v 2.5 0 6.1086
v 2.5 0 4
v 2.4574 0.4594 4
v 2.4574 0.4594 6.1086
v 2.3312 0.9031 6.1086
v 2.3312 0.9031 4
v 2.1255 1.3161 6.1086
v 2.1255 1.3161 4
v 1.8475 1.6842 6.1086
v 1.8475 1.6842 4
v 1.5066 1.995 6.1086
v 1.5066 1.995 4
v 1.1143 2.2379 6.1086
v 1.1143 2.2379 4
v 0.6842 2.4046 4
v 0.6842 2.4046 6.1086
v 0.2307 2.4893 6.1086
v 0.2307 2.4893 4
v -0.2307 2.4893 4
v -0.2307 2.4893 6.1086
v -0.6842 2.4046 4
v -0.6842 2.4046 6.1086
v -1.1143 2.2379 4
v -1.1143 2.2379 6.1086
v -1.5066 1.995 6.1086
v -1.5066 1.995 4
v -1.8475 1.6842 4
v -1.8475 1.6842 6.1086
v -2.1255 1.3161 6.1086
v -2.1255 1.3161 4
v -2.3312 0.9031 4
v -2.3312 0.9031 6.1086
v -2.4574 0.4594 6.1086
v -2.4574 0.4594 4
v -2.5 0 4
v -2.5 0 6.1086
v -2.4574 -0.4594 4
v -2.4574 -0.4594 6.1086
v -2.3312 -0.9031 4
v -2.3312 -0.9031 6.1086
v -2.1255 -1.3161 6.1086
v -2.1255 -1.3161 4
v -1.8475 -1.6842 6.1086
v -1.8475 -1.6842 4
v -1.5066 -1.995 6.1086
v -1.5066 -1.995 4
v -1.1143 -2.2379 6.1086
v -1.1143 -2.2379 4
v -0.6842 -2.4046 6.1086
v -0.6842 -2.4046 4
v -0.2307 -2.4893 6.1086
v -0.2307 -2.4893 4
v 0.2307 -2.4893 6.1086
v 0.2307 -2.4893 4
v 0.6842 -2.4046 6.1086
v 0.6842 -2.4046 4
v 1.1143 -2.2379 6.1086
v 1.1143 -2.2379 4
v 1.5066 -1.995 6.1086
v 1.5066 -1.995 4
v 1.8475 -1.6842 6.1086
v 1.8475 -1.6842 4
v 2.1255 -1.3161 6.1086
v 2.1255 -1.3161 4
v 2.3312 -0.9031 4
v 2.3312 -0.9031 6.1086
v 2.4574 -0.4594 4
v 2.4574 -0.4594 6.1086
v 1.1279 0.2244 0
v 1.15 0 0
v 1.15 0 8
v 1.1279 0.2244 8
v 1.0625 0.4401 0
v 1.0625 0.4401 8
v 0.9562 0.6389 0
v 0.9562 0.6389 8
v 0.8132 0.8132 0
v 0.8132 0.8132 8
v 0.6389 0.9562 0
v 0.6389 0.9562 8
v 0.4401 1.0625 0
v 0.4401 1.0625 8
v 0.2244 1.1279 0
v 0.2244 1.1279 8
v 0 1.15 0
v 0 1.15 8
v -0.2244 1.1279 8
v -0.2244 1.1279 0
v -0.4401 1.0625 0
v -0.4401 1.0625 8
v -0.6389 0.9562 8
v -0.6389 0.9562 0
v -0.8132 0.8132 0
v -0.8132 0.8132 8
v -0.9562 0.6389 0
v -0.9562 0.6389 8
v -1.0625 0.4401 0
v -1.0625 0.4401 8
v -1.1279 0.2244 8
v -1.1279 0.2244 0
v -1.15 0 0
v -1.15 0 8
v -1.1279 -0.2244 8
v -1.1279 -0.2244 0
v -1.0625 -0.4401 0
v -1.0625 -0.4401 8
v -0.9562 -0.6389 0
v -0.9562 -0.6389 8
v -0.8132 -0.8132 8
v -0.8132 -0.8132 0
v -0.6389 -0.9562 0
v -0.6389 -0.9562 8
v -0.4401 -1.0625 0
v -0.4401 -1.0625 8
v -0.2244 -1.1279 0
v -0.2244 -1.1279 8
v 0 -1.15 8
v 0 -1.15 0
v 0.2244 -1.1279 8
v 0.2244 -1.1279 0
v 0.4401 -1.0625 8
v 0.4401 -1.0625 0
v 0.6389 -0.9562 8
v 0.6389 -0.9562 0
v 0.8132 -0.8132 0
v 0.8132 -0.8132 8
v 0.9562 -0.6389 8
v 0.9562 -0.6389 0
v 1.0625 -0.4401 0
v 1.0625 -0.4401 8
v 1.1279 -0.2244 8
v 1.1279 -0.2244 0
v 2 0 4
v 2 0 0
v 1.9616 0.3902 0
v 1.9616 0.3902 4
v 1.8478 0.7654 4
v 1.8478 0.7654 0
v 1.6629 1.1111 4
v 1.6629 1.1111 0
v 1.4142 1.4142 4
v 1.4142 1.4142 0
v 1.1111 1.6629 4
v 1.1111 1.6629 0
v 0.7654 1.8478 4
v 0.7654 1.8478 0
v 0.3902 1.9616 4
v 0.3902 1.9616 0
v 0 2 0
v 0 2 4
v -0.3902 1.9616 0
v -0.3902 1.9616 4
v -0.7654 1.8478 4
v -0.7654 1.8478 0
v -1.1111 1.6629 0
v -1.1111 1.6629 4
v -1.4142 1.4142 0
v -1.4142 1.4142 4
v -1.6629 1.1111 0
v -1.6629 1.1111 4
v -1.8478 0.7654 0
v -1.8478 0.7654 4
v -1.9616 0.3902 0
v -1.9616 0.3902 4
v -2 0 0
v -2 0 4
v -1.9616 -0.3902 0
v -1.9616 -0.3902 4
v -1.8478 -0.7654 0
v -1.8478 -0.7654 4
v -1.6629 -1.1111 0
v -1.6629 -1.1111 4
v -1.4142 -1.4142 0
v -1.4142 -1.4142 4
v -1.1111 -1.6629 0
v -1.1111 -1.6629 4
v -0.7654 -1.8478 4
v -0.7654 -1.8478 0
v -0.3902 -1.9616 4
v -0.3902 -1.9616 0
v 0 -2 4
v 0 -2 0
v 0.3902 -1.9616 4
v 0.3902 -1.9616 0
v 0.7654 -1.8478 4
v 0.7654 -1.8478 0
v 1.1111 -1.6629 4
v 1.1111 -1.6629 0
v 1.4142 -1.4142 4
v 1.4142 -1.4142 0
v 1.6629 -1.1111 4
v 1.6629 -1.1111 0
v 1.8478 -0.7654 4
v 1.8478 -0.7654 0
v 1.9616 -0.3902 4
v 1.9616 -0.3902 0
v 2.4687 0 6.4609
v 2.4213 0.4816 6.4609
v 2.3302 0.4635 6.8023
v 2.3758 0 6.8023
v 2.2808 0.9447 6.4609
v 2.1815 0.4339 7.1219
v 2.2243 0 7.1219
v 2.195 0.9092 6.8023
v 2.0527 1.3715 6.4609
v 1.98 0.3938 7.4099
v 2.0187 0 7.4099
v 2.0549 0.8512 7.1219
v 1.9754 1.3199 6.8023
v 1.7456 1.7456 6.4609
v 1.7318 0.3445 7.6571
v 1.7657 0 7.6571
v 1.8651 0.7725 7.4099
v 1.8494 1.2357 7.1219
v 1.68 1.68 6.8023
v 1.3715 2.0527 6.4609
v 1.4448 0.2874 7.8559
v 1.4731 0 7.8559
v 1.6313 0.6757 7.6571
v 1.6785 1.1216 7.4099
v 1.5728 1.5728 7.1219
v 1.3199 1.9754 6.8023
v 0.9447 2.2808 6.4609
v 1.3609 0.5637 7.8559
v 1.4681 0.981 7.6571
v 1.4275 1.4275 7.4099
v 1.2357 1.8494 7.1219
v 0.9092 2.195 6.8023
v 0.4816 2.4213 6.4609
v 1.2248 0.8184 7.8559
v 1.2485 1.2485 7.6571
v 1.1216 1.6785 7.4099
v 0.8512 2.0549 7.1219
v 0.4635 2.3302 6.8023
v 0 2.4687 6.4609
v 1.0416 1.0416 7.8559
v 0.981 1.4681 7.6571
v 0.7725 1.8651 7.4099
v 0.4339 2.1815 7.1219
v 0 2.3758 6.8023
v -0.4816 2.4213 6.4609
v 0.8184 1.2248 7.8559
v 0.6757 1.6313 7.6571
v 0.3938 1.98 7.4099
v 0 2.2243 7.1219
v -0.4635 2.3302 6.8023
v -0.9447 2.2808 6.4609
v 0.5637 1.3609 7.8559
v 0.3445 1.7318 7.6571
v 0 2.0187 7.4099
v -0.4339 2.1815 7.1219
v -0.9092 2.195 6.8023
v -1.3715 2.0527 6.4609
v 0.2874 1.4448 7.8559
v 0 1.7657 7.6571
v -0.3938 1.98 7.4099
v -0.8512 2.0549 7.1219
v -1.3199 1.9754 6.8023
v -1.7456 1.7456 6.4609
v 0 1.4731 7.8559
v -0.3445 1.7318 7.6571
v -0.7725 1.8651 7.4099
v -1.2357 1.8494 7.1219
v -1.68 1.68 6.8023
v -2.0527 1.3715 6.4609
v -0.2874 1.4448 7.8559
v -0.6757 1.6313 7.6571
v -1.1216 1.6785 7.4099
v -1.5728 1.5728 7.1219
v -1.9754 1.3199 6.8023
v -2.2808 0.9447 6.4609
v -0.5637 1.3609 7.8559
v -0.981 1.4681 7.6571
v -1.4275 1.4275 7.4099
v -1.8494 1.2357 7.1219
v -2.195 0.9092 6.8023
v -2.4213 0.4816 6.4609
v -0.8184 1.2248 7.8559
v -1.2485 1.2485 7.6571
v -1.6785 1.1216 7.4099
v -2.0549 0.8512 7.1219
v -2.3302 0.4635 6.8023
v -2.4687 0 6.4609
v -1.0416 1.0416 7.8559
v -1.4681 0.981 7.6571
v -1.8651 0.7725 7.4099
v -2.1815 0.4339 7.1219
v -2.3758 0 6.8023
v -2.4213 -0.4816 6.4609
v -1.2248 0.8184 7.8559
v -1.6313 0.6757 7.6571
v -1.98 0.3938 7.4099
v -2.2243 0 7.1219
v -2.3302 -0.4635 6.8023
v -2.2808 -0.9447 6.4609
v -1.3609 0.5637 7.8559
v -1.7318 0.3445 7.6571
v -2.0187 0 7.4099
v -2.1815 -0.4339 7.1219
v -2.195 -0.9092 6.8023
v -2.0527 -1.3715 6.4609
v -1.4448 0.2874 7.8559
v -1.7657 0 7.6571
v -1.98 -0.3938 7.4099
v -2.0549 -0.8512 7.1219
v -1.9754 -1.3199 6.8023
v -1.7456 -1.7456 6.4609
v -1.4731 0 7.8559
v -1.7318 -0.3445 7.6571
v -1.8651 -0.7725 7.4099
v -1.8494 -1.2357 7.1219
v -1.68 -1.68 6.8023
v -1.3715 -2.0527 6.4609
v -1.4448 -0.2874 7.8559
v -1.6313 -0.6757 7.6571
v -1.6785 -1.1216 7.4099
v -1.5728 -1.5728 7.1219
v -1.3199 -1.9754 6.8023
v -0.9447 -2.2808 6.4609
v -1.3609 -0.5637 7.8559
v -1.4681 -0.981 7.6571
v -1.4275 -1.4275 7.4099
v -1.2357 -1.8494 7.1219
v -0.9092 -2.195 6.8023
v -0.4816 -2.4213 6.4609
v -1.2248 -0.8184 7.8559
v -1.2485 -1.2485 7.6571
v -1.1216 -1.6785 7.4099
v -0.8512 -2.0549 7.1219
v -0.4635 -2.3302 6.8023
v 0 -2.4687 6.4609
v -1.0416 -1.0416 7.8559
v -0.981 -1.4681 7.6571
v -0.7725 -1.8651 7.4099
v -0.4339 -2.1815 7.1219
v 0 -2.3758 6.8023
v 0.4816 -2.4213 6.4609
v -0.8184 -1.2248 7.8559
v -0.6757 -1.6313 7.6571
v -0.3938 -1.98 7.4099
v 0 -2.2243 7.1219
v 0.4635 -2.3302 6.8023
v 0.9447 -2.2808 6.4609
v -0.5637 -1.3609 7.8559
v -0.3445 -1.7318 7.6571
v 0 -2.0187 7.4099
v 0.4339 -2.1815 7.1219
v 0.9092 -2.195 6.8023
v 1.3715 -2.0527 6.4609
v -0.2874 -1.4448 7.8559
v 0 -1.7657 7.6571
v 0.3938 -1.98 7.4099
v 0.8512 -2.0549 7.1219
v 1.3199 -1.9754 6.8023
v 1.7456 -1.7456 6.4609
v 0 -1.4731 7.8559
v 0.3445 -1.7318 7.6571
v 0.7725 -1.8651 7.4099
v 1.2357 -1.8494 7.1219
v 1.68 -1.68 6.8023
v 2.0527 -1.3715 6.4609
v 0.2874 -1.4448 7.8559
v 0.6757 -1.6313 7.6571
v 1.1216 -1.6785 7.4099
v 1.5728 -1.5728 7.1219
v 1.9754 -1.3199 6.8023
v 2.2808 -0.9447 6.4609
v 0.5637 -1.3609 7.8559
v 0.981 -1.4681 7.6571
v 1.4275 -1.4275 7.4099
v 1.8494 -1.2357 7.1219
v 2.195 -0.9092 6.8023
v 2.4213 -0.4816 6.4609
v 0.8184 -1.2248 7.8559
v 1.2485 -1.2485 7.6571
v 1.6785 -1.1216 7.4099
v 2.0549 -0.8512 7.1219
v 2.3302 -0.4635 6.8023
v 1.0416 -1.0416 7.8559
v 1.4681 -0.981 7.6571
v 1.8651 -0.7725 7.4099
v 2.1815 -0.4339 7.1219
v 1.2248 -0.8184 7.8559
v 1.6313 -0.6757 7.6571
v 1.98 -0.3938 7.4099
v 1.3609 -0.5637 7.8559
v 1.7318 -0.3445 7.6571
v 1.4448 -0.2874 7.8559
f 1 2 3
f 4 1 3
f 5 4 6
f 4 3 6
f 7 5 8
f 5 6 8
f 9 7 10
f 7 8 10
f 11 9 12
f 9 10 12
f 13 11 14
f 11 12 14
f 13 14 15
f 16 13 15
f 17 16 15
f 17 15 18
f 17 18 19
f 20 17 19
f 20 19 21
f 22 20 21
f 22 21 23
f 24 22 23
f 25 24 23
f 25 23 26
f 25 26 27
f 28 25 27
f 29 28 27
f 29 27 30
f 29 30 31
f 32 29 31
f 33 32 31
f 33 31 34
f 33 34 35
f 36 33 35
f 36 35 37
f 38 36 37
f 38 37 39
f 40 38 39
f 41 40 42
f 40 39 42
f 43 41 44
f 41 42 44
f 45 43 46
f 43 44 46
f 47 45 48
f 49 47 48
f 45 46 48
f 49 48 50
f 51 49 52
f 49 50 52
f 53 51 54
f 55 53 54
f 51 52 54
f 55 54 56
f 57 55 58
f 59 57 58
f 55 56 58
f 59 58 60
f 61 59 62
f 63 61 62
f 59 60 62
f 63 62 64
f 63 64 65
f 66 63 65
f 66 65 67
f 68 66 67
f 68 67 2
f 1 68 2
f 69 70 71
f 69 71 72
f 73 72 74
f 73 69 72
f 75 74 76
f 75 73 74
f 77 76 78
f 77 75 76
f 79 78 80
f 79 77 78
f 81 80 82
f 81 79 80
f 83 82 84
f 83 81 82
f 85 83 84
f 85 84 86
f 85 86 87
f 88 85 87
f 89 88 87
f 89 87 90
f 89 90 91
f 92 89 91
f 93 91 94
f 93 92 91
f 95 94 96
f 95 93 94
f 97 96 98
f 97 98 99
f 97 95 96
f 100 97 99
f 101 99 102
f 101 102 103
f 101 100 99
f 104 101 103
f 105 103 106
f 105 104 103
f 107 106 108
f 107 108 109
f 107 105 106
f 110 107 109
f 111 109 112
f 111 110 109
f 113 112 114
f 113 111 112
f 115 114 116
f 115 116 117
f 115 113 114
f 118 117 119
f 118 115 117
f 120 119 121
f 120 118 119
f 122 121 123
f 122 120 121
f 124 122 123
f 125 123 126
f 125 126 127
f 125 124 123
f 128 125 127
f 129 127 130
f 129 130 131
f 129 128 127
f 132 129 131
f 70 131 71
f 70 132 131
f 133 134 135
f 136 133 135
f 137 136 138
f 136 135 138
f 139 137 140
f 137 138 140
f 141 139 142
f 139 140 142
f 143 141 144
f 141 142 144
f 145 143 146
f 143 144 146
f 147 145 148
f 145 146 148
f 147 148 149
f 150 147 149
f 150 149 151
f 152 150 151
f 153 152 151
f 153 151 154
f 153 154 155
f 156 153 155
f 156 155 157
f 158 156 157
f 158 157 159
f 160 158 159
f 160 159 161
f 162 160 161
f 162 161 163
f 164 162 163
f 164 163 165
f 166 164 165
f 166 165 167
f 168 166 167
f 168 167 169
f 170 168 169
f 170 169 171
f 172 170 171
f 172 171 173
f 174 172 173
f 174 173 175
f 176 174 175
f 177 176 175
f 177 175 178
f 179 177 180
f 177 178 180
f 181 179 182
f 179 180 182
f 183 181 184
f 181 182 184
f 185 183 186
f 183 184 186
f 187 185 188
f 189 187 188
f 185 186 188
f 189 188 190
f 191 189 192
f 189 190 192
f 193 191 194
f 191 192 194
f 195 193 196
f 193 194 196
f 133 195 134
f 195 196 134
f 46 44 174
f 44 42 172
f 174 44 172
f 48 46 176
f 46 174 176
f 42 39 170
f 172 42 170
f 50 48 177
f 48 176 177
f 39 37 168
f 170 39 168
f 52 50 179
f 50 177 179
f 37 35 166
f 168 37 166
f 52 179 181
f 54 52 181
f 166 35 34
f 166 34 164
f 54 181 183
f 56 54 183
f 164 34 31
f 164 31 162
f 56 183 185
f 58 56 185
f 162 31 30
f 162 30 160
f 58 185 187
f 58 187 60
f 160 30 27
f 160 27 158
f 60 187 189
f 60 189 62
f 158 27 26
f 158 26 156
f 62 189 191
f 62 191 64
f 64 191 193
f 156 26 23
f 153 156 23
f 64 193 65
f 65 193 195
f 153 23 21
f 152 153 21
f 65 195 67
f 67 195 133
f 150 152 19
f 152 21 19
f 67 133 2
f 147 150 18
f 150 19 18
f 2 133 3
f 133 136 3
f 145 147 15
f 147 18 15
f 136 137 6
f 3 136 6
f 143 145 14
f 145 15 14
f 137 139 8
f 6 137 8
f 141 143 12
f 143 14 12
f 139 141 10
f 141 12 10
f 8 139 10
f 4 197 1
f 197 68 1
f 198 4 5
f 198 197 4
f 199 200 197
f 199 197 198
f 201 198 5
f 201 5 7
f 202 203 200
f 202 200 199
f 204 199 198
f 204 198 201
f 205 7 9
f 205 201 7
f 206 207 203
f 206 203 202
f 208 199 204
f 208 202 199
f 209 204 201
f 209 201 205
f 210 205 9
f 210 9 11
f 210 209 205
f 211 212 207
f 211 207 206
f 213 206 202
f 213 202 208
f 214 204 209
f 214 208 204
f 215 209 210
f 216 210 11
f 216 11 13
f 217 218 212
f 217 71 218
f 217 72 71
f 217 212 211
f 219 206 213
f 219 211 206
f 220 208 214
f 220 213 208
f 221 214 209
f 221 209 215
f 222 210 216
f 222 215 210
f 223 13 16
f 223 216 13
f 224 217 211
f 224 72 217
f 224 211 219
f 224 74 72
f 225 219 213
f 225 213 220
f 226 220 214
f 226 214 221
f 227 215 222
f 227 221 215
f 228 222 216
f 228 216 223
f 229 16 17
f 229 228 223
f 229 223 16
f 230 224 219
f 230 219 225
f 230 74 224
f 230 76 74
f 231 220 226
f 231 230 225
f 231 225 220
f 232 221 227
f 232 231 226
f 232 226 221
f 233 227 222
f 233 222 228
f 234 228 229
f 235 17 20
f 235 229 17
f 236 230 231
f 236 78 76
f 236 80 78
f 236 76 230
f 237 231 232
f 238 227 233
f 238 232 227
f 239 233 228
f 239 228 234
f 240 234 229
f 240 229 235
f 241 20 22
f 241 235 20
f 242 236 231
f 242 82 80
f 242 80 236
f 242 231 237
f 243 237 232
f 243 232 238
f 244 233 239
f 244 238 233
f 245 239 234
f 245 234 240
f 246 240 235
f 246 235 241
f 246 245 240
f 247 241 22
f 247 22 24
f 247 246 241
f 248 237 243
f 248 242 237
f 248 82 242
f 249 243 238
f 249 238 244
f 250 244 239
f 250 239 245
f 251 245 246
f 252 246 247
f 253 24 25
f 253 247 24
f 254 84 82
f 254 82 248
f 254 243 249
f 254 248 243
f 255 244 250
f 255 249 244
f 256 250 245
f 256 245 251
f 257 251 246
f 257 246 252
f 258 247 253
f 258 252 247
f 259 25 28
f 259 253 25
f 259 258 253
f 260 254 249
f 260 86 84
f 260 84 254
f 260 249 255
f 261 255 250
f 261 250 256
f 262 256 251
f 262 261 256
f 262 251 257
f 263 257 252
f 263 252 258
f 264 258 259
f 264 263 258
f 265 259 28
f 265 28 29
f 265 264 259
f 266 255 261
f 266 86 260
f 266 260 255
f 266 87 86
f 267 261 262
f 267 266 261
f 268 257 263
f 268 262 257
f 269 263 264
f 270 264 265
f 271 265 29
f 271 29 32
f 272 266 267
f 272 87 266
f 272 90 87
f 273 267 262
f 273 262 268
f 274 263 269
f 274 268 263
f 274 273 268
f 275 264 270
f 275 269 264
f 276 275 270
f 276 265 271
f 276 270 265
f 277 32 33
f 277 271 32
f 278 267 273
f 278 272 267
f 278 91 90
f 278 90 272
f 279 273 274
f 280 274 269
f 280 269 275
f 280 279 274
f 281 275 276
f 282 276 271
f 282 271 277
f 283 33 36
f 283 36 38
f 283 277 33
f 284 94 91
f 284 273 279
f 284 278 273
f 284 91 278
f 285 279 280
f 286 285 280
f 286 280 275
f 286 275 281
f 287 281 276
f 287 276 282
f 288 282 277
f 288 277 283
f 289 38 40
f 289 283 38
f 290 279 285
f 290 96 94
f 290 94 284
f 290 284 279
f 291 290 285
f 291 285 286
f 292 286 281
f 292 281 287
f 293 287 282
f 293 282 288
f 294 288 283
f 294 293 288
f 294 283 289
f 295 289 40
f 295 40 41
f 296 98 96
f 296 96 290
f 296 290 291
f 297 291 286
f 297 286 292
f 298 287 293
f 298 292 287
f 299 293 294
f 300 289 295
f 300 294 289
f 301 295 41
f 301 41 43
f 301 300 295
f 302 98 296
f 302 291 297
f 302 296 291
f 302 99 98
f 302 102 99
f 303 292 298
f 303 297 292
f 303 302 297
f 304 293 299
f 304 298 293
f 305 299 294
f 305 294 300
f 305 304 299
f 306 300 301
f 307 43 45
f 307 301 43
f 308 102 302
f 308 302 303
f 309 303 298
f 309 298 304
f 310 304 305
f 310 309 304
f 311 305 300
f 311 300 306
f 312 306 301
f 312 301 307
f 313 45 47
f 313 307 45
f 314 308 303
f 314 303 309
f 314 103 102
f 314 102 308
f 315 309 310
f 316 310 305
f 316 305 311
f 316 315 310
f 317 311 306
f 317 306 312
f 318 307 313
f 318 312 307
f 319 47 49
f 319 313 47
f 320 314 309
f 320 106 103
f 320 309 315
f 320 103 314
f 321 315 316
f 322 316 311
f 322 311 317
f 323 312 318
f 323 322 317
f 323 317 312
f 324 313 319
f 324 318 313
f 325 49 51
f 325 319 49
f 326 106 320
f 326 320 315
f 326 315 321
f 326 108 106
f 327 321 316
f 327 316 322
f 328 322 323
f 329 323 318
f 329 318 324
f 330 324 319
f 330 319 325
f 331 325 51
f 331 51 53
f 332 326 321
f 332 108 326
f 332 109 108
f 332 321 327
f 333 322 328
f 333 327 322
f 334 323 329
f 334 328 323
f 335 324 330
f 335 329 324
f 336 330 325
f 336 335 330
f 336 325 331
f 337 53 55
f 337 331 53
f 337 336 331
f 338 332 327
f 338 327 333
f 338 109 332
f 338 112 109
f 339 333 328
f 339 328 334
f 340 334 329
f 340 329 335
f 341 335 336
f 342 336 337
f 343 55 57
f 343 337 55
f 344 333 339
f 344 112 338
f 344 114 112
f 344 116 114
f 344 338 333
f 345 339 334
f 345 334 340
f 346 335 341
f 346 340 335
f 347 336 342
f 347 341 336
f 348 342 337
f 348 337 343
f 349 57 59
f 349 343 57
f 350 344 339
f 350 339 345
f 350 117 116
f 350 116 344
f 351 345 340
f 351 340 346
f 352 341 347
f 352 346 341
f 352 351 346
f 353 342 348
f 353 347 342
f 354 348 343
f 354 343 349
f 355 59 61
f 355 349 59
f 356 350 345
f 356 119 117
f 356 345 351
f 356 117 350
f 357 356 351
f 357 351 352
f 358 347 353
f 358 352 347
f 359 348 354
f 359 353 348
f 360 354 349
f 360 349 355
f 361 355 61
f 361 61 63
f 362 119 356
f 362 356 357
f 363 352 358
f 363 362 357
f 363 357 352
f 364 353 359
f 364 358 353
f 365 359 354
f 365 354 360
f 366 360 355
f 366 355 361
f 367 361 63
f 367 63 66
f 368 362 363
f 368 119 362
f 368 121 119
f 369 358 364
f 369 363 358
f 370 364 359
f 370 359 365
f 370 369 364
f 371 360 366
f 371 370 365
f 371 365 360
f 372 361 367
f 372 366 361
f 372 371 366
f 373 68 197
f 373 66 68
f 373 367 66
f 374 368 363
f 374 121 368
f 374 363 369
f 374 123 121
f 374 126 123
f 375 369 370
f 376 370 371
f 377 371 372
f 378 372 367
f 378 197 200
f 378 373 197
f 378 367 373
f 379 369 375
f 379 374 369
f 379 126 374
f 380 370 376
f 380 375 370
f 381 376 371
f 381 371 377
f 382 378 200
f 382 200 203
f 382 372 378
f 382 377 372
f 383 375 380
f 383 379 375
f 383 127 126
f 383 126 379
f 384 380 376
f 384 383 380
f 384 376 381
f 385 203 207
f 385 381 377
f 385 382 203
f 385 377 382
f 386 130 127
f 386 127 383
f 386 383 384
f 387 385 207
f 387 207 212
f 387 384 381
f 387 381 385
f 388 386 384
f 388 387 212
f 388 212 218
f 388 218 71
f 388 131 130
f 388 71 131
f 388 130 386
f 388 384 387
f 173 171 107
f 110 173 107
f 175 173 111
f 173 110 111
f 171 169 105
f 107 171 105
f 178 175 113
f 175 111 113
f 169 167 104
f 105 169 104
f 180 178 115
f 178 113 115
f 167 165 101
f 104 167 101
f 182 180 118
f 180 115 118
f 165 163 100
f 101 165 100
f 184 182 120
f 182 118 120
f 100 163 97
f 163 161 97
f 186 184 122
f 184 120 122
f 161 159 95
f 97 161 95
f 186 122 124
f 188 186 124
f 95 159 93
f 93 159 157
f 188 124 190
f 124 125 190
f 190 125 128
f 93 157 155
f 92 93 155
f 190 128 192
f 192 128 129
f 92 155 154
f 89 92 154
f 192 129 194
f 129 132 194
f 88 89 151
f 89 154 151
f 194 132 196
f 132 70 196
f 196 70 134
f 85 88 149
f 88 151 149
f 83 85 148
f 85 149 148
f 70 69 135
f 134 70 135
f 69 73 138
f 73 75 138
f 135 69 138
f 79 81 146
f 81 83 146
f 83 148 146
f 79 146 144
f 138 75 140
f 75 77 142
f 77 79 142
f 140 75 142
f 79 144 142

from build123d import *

# Parameters (mm, degrees)
F0_R     = 2
F0_R_2   = 1.15
F1_DEPTH = 8
F3_R     = 2.5
F3_R_2   = 2
F4_DEPTH = 4


# Not quite as in the source:
# - a fillet or chamfer that OpenCascade refuses, or shapes differently, is made with other operations: its cross-section is extruded or revolved along the edge and cut away or added


with BuildPart() as f1:
    # F0 (on Top) → F1 (new body)
    with BuildSketch(Plane.XY):
        Circle(F0_R)
        Circle(F0_R_2, mode=Mode.SUBTRACT)
    extrude(amount=F1_DEPTH)

    # F3 (on offset) → F4 (join, through all)
    with BuildSketch(Plane.XY.offset(4)):
        Circle(F3_R)
        Circle(F3_R_2, mode=Mode.SUBTRACT)
    extrude(amount=F4_DEPTH)

    # F5: fillet of radius 2 on 1 edges, made by hand

    # F5_s1 → F5_t2 (revolve, cut)
    with BuildSketch(Plane.XZ):
        with BuildLine():
            ThreePointArc((2.5, 6.1085719681), (2.1278820596, 7.2704669719), (1.15, 8))
            Line((1.15, 8), (2.5, 8))
            Line((2.5, 8), (2.5, 6.1085719681))
        make_face()
    revolve(axis=Axis((0, 0, 8), (0, 0, 1)), mode=Mode.SUBTRACT)


solid = f1.part
